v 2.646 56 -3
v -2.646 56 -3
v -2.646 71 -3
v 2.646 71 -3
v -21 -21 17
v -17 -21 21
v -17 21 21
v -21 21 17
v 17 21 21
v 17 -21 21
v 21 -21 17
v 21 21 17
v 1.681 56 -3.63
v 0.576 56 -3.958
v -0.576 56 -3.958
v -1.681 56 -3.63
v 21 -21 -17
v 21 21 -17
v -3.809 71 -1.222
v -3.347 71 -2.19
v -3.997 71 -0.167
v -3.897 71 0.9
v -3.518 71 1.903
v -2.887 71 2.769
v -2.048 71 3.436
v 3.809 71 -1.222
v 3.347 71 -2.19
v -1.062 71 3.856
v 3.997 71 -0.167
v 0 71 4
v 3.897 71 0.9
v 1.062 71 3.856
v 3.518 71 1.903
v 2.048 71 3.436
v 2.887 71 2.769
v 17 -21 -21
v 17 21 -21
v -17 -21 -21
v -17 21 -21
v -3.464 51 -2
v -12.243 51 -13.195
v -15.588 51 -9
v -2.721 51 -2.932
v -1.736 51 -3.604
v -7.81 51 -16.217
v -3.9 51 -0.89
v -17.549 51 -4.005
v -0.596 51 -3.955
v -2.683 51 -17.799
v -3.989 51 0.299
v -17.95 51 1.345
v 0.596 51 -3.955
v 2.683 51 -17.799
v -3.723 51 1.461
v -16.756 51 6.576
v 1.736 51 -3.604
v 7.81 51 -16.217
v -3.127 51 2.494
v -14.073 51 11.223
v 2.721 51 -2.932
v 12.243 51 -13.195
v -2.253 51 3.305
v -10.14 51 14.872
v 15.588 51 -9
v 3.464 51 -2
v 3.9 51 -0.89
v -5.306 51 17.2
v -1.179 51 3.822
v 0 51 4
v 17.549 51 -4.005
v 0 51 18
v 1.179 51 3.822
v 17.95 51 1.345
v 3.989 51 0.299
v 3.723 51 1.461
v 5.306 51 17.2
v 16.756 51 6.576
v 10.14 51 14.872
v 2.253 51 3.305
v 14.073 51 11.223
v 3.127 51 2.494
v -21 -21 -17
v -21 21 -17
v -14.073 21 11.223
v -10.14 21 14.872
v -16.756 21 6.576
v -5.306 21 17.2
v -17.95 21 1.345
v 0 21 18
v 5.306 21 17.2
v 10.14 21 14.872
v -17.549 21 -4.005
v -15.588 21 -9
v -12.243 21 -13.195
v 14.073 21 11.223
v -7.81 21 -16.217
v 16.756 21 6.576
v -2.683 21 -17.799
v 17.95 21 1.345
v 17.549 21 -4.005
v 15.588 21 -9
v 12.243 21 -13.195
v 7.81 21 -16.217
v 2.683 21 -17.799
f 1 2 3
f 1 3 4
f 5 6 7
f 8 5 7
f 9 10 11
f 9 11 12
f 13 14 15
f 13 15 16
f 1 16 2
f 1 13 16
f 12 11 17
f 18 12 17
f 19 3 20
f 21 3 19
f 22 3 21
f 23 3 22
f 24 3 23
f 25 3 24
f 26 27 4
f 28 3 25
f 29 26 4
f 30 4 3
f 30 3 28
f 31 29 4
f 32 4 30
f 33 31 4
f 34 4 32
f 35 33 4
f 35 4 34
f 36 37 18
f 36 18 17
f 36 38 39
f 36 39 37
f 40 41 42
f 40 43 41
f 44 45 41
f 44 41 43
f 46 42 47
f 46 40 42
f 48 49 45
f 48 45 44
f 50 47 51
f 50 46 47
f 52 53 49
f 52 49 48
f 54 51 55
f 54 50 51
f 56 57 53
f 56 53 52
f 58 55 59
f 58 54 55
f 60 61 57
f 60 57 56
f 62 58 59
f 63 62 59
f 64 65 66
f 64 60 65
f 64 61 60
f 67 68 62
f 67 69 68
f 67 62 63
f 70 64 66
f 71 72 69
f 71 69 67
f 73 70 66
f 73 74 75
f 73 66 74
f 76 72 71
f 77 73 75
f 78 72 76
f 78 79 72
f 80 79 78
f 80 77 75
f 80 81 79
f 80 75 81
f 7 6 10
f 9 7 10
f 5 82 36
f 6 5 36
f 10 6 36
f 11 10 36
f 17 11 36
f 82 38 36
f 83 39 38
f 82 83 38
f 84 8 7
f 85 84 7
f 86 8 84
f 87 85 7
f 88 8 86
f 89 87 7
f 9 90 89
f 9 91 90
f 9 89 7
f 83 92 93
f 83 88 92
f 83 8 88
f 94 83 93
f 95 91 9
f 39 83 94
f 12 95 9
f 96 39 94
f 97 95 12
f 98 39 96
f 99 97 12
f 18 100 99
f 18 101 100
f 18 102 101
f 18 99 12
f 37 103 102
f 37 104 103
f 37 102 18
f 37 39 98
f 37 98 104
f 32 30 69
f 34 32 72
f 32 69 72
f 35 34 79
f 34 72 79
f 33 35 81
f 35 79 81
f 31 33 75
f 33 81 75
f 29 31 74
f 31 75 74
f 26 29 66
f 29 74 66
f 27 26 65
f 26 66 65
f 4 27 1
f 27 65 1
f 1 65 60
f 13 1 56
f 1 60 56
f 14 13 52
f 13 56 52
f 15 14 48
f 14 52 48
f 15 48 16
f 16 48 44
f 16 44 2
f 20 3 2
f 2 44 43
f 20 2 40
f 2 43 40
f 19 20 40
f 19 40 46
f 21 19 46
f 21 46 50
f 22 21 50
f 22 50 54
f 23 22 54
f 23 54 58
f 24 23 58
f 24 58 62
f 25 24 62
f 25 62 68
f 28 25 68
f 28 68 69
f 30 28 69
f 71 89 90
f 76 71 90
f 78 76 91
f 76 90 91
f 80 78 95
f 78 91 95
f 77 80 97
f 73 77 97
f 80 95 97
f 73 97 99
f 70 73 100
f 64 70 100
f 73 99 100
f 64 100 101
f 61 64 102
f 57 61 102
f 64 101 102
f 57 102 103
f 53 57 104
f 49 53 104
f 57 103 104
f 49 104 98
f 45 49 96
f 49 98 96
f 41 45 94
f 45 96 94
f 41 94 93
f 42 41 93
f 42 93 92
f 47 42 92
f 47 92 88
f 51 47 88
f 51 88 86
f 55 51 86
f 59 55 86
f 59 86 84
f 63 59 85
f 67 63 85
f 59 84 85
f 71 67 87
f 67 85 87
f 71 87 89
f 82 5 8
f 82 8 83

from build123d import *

# Parameters (mm, degrees)
SKETCH_1_W          = 42
SKETCH_1_H          = 42
EXTRUDE_1_DEPTH     = 21
CHAMFER_1_SIZE      = 4
SKETCH_2_R          = 18
EXTRUDE_2_DEPTH     = 30
SKETCH_3_R          = 4
EXTRUDE_3_DEPTH     = 20
CUT_EXTRUDE_START   = -15
CUT_EXTRUDE_1_DEPTH = 15


with BuildPart() as part:
    # 스케치1 → 보스-돌출1 (new, symmetric)
    with BuildSketch(Plane(origin=(0, 0, 0), x_dir=(1, 0, 0), z_dir=(0, 1, 0))):
        Rectangle(SKETCH_1_W, SKETCH_1_H)
    extrude(amount=EXTRUDE_1_DEPTH, both=True)

    # 모따기1
    chamfer_1_edges = [part.edges().sort_by_distance(p)[0] for p in [
        (21, 0, 21),
        (-21, 0, 21),
        (-21, 0, -21),
        (21, 0, -21),
    ]]
    chamfer(chamfer_1_edges, length=CHAMFER_1_SIZE)

    # 스케치2 → 보스-돌출2 (add)
    with BuildSketch(Plane(origin=(0, 21, 0), x_dir=(1, 0, 0), z_dir=(0, 1, 0))):
        with Locations(Location((0, 0, 0), (0, 0, 270))):
            Circle(SKETCH_2_R)
    extrude(amount=EXTRUDE_2_DEPTH)

    # 스케치3 → 보스-돌출3 (add)
    with BuildSketch(Plane(origin=(0, 51, 0), x_dir=(1, 0, 0), z_dir=(0, 1, 0))):
        with Locations(Location((0, 0, 0), (0, 0, 270))):
            Circle(SKETCH_3_R)
    extrude(amount=EXTRUDE_3_DEPTH)

    # 스케치4 → 컷-돌출1 (cut)
    with BuildSketch(Plane(origin=(0, 71, 0), x_dir=(1, 0, 0), z_dir=(0, 1, 0)).offset(CUT_EXTRUDE_START)):
        with BuildLine():
            Line((-2.645751311, 3), (2.645751311, 3))
            ThreePointArc((2.645751311, 3), (0, 4), (-2.645751311, 3))
        make_face()
    extrude(amount=CUT_EXTRUDE_1_DEPTH, mode=Mode.SUBTRACT)


solid = part.part
